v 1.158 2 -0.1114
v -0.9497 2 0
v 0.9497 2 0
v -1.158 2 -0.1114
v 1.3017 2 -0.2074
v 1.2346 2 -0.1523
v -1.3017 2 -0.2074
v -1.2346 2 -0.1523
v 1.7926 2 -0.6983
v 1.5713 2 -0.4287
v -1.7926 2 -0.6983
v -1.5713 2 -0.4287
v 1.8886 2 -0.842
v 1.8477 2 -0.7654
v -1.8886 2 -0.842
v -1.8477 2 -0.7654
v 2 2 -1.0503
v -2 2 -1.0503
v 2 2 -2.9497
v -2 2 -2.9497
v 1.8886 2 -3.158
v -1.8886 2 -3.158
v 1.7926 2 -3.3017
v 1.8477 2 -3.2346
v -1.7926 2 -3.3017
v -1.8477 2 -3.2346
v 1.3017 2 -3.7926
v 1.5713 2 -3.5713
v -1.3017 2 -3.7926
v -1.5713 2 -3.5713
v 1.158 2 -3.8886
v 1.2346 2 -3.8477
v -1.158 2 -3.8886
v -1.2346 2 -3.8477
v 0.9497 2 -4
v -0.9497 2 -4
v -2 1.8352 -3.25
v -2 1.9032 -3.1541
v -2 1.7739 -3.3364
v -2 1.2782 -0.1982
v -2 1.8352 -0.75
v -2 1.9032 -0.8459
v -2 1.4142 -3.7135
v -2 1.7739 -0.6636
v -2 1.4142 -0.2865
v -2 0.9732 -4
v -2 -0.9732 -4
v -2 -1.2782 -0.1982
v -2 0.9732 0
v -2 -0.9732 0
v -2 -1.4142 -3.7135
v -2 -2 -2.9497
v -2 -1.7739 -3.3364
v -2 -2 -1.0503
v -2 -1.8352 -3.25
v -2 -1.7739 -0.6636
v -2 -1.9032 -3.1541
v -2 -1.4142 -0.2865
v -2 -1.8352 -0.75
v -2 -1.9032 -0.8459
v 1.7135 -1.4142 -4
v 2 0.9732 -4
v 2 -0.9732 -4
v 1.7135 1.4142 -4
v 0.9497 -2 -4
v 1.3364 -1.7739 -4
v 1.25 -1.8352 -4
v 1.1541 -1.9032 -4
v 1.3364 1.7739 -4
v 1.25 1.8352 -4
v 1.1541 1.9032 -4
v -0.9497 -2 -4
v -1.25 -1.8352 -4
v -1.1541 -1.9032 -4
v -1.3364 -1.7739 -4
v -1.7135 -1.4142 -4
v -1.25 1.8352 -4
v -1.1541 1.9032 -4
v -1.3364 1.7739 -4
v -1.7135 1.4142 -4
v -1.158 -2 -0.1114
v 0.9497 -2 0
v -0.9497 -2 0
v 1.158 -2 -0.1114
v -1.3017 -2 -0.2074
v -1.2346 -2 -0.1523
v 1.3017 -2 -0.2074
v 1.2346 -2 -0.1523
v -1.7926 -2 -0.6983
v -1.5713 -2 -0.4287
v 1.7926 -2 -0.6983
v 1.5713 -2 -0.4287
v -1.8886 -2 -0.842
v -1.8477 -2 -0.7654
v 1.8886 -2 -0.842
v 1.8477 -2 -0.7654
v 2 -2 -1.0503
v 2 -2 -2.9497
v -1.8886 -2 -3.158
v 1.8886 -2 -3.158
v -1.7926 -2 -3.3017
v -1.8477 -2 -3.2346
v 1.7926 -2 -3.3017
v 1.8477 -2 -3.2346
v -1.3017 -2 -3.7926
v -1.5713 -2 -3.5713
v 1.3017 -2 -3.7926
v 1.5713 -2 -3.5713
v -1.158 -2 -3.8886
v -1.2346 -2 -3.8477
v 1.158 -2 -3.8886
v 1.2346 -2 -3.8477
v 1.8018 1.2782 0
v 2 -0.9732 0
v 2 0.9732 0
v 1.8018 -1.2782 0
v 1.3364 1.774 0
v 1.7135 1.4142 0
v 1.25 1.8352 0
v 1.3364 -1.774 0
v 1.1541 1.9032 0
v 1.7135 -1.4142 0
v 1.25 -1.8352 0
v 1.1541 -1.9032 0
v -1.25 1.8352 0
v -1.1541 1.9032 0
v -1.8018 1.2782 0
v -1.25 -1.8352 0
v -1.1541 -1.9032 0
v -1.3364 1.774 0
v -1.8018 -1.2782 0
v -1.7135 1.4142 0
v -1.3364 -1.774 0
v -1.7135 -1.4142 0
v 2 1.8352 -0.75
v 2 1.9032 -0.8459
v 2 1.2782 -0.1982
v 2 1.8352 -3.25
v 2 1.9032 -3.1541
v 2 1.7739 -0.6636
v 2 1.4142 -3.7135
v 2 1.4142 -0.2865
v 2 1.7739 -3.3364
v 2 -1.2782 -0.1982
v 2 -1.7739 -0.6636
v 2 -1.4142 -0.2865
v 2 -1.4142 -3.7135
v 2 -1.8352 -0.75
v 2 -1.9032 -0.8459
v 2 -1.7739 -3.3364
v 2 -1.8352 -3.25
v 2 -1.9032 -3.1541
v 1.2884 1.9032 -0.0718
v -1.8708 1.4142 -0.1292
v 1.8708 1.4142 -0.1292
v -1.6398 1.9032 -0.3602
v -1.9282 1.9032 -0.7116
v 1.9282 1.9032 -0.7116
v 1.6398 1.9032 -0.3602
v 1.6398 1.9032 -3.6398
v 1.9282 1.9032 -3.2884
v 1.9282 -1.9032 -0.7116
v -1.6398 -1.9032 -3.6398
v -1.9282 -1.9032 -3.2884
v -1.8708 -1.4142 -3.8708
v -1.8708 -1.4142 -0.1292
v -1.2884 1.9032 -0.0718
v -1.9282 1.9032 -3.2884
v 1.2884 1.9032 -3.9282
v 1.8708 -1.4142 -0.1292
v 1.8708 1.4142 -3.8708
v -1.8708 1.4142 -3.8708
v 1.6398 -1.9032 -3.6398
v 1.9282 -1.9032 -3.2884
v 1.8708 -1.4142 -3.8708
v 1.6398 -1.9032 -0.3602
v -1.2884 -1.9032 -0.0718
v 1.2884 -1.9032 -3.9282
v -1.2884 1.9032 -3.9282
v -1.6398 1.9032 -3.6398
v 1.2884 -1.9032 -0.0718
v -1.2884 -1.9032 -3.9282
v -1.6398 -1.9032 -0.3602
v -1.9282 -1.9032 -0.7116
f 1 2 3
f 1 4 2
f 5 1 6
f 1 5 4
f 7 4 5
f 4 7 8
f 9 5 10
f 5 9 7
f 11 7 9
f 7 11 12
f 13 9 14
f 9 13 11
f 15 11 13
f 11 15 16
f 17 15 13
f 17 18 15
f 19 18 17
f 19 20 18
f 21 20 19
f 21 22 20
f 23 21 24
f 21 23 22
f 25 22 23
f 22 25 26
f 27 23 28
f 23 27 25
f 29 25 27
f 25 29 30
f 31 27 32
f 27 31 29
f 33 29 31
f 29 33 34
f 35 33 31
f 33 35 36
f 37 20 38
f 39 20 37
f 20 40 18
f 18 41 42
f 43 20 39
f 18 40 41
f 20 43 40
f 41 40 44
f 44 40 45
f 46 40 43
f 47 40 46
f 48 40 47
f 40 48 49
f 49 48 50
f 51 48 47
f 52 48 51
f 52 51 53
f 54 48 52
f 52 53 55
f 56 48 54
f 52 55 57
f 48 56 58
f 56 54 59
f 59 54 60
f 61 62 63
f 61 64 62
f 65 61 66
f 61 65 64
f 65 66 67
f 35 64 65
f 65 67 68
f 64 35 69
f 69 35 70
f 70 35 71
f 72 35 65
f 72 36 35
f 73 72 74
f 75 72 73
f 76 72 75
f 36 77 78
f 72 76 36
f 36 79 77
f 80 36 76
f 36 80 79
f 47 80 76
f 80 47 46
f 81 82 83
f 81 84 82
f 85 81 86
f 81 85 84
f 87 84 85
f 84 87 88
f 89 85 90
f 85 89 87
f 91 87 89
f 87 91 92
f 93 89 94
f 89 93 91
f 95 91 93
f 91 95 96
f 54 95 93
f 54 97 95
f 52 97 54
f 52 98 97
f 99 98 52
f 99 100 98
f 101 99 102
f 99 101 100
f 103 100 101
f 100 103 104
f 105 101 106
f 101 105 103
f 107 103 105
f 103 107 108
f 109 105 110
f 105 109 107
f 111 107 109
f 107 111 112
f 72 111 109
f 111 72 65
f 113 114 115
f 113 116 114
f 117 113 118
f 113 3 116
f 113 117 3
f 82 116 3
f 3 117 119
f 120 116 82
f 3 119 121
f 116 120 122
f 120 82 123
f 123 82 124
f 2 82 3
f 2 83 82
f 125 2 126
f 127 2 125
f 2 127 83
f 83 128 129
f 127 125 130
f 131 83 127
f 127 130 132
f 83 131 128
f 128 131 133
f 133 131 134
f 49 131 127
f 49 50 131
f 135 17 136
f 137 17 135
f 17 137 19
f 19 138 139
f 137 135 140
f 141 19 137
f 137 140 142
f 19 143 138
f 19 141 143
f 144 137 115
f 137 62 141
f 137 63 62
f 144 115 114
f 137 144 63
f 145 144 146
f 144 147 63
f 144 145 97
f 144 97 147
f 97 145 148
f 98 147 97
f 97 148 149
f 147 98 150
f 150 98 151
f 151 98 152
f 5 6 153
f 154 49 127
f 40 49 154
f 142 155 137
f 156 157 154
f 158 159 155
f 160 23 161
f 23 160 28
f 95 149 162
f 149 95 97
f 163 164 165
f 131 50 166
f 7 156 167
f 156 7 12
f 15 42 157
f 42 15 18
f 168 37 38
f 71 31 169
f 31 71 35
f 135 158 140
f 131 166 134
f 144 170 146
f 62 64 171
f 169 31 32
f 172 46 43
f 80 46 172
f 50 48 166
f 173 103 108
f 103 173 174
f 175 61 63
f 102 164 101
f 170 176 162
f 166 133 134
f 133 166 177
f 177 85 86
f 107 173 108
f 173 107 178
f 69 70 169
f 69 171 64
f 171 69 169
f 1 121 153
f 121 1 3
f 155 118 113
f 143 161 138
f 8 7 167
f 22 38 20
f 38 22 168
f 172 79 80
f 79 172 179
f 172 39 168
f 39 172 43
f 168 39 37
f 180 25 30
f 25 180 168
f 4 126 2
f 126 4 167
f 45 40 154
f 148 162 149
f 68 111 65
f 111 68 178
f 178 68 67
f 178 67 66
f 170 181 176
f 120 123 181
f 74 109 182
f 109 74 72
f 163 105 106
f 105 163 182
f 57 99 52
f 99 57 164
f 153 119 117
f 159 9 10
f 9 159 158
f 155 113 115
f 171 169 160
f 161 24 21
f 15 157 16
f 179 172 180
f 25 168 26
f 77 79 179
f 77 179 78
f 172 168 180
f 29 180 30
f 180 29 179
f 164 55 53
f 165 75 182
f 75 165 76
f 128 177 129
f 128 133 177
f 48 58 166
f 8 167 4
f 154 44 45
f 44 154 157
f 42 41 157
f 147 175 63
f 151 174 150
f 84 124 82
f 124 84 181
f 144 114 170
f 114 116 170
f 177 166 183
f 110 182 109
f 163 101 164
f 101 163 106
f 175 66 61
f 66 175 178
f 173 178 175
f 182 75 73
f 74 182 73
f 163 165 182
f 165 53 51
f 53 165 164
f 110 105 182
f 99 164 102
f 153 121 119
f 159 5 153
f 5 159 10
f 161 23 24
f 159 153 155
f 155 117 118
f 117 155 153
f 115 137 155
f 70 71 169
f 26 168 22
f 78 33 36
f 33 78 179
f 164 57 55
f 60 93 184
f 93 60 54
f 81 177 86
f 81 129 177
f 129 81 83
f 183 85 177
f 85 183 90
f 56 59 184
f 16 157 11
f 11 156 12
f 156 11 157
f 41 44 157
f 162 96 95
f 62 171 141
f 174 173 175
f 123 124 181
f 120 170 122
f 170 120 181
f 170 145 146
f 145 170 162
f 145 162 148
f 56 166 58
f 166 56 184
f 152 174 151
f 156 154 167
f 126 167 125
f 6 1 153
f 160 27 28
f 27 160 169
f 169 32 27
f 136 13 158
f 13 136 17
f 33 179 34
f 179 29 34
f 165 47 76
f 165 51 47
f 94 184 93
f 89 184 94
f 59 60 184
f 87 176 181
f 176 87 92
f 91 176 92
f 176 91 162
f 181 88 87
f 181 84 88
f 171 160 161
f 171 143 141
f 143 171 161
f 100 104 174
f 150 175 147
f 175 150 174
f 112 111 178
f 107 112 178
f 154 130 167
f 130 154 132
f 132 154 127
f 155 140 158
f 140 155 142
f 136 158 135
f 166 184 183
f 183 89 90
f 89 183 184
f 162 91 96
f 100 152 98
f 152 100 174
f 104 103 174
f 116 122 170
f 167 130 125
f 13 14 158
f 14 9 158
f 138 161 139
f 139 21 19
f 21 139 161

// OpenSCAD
// Start: lazy_union
default_5_default_5();
// End: lazy_union

// Modules.

// 'PartMaterial undef-default - undef-default'
module default_5_default_5() {
  // 'None : _combine_solids_and_holes'
  union() {
    // 'intersection1 : _combine_solids_and_holes'
    intersection() {
      // 'box'
      multmatrix(m=[[1.0, 0.0, 0.0, -2.0], [0.0, 0.0, 1.0, -2.0], [-0.0, -1.0, -0.0, -0.0], [0.0, 0.0, 0.0, 1.0]]) {
        // 'box'
        color(c=[0.0, 0.0, 1.0, 1.0]) {
          // 'box : _combine_solids_and_holes'
          union() {
            // 'box'
            cube(size=[4.0, 4.0, 4.0]);
          }
        }
      }
      // 'sphere'
      multmatrix(m=[[1.0, 0.0, 0.0, 0.0], [0.0, 0.0, -1.0, 0.0], [0.0, 1.0, 0.0, -2.0], [0.0, 0.0, 0.0, 1.0]]) {
        // 'sphere'
        color(c=[0.0, 1.0, 0.0, 1.0]) {
          // 'sphere : _combine_solids_and_holes'
          union() {
            // 'sphere'
            sphere(r=3.0, $fn=32);
          }
        }
      }
    }
  }
} // end module default_5_default_5
